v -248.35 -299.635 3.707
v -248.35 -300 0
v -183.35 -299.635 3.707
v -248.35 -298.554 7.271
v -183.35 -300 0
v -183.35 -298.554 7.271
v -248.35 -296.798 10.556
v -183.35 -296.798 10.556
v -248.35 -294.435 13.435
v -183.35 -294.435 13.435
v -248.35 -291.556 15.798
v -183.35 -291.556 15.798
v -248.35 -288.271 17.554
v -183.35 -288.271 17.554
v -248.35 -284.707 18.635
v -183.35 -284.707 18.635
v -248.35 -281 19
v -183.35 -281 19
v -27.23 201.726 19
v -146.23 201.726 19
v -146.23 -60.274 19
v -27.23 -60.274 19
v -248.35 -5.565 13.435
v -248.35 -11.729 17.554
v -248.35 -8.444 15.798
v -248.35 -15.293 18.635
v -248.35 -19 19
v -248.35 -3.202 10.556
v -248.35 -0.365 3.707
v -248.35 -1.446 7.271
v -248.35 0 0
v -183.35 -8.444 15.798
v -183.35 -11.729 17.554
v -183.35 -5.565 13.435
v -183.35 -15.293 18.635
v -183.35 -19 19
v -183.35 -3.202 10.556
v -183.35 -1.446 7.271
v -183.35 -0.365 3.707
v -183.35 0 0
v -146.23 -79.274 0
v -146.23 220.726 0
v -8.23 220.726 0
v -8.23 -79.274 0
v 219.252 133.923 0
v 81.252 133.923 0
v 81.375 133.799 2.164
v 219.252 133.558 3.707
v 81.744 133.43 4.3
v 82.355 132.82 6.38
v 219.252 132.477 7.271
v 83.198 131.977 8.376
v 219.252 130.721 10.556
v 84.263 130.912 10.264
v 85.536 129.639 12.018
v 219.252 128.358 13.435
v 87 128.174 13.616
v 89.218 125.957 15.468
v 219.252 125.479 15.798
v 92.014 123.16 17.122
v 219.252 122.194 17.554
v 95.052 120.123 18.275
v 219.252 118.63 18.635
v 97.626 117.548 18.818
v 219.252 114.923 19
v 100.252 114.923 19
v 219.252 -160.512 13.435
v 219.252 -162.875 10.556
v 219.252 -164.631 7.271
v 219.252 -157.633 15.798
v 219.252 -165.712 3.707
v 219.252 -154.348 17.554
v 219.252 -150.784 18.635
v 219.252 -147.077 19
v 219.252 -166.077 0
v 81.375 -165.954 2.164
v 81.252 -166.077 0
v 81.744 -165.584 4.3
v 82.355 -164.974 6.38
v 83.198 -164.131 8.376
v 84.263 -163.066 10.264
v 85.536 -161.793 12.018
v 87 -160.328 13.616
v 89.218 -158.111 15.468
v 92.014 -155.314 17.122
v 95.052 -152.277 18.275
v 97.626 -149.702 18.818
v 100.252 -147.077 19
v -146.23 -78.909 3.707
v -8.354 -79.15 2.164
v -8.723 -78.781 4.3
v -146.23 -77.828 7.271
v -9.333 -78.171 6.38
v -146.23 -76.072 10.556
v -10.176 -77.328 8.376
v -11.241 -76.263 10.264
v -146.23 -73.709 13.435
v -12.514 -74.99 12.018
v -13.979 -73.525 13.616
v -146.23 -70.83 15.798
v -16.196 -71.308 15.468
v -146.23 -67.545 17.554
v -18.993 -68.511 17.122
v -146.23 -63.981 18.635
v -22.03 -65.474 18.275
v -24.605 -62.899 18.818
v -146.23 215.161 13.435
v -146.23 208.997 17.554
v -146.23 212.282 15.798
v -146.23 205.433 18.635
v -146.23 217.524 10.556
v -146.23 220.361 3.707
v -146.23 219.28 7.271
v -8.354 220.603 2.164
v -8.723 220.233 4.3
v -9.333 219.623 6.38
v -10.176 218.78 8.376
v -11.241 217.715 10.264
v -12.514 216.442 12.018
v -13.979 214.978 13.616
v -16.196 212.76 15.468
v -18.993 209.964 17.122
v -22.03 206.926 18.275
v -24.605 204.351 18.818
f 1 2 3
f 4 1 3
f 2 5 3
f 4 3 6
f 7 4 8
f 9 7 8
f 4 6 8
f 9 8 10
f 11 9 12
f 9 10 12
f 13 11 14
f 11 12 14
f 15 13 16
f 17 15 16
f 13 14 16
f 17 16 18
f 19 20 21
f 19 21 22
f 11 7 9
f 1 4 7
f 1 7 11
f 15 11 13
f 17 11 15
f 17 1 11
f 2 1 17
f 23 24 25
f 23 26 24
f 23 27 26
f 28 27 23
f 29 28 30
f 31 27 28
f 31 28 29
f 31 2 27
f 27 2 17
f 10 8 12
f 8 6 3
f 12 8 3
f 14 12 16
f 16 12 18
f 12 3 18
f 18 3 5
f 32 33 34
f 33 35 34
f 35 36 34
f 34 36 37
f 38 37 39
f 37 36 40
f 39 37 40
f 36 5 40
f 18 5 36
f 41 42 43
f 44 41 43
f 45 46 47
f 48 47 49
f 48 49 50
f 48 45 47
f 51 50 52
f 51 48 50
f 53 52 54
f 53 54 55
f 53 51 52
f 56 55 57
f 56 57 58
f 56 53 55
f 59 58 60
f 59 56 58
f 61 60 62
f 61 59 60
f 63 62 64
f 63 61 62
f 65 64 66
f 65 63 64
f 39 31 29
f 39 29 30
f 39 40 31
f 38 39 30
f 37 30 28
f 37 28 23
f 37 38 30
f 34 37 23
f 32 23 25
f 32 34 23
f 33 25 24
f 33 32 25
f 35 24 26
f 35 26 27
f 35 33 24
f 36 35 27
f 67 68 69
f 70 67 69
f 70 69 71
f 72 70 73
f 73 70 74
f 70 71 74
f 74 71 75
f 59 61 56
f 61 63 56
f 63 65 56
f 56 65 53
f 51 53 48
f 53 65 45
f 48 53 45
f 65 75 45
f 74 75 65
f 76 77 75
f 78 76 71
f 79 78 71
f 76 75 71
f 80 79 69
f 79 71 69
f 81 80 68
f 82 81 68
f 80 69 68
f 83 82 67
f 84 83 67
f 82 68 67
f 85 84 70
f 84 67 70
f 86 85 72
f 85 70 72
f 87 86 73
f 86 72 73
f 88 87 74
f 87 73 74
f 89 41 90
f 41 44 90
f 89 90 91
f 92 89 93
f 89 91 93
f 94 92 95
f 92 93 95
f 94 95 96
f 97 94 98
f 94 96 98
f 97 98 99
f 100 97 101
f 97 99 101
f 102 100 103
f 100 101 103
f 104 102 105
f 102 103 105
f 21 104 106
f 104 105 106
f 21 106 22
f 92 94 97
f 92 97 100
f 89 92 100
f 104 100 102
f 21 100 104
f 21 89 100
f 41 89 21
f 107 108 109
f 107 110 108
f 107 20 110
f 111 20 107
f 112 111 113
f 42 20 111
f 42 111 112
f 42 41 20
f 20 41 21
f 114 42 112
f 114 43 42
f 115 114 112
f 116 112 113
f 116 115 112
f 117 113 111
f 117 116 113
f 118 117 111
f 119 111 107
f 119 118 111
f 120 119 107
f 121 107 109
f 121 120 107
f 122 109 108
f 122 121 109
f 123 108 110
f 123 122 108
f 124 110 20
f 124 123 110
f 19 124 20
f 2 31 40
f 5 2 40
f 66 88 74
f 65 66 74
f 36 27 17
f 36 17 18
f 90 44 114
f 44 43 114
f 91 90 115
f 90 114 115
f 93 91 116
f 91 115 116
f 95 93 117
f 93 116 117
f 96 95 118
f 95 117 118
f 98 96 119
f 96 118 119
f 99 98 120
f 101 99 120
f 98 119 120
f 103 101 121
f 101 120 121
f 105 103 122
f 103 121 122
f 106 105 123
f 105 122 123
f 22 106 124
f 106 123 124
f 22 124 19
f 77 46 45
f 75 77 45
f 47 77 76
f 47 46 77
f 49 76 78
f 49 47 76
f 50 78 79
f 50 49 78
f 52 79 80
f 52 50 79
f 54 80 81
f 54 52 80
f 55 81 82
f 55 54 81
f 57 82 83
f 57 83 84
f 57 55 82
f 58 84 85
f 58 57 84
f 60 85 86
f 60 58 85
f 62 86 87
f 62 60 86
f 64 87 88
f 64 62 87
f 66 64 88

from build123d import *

# Parameters (mm, degrees)
F0_W     = 138
F0_H     = 300
F1_DEPTH = 19
F2_W     = 65
F2_H     = 300
F3_DEPTH = 19
F4_W     = 138
F4_H     = 300
F5_DEPTH = 19
F6_R     = 18.99999
F6_2_R   = 18.99999
F6_3_R   = 18.99999


# Not quite as in the source:
# - a fillet or chamfer is up to 0.001 mm smaller than in the source, because OpenCascade refuses the exact size


with BuildPart() as f1:
    # F0 (on Top) → F1 (new body)
    with BuildSketch(Plane.XY):
        with Locations((-77.230250597, 70.7261949778)):
            Rectangle(F0_W, F0_H)
    extrude(amount=F1_DEPTH)

    # F6#2 (radius 19 in the source; OpenCascade refuses exactly that, so slightly less here)
    f6_2_edges = [f1.edges().sort_by_distance(p)[0] for p in [
        (-77.230251, -79.273805, 19),
        (-8.230251, 70.726195, 19),
        (-77.230251, 220.726195, 19),
    ]]
    fillet(f6_2_edges, radius=F6_2_R)


with BuildPart() as f3:
    # F2 (on Top) → F3 (new body)
    with BuildSketch(Plane.XY):
        with Locations((-215.8502775431, -150)):
            Rectangle(F2_W, F2_H)
    extrude(amount=F3_DEPTH)

    # F6 (radius 19 in the source; OpenCascade refuses exactly that, so slightly less here)
    f6_edges = [f3.edges().sort_by_distance(p)[0] for p in [
        (-215.850278, 0, 19),
        (-215.850278, -300, 19),
    ]]
    fillet(f6_edges, radius=F6_R)


with BuildPart() as f5:
    # F4 (on Top) → F5 (new body)
    with BuildSketch(Plane.XY):
        with Locations((150.2515169382, -16.0771518946)):
            Rectangle(F4_W, F4_H)
    extrude(amount=F5_DEPTH)

    # F6#3 (radius 19 in the source; OpenCascade refuses exactly that, so slightly less here)
    f6_3_edges = [f5.edges().sort_by_distance(p)[0] for p in [
        (150.251517, 133.922848, 19),
        (81.251517, -16.077152, 19),
        (150.251517, -166.077152, 19),
    ]]
    fillet(f6_3_edges, radius=F6_3_R)


solid = Compound([f1.part, f3.part, f5.part])
